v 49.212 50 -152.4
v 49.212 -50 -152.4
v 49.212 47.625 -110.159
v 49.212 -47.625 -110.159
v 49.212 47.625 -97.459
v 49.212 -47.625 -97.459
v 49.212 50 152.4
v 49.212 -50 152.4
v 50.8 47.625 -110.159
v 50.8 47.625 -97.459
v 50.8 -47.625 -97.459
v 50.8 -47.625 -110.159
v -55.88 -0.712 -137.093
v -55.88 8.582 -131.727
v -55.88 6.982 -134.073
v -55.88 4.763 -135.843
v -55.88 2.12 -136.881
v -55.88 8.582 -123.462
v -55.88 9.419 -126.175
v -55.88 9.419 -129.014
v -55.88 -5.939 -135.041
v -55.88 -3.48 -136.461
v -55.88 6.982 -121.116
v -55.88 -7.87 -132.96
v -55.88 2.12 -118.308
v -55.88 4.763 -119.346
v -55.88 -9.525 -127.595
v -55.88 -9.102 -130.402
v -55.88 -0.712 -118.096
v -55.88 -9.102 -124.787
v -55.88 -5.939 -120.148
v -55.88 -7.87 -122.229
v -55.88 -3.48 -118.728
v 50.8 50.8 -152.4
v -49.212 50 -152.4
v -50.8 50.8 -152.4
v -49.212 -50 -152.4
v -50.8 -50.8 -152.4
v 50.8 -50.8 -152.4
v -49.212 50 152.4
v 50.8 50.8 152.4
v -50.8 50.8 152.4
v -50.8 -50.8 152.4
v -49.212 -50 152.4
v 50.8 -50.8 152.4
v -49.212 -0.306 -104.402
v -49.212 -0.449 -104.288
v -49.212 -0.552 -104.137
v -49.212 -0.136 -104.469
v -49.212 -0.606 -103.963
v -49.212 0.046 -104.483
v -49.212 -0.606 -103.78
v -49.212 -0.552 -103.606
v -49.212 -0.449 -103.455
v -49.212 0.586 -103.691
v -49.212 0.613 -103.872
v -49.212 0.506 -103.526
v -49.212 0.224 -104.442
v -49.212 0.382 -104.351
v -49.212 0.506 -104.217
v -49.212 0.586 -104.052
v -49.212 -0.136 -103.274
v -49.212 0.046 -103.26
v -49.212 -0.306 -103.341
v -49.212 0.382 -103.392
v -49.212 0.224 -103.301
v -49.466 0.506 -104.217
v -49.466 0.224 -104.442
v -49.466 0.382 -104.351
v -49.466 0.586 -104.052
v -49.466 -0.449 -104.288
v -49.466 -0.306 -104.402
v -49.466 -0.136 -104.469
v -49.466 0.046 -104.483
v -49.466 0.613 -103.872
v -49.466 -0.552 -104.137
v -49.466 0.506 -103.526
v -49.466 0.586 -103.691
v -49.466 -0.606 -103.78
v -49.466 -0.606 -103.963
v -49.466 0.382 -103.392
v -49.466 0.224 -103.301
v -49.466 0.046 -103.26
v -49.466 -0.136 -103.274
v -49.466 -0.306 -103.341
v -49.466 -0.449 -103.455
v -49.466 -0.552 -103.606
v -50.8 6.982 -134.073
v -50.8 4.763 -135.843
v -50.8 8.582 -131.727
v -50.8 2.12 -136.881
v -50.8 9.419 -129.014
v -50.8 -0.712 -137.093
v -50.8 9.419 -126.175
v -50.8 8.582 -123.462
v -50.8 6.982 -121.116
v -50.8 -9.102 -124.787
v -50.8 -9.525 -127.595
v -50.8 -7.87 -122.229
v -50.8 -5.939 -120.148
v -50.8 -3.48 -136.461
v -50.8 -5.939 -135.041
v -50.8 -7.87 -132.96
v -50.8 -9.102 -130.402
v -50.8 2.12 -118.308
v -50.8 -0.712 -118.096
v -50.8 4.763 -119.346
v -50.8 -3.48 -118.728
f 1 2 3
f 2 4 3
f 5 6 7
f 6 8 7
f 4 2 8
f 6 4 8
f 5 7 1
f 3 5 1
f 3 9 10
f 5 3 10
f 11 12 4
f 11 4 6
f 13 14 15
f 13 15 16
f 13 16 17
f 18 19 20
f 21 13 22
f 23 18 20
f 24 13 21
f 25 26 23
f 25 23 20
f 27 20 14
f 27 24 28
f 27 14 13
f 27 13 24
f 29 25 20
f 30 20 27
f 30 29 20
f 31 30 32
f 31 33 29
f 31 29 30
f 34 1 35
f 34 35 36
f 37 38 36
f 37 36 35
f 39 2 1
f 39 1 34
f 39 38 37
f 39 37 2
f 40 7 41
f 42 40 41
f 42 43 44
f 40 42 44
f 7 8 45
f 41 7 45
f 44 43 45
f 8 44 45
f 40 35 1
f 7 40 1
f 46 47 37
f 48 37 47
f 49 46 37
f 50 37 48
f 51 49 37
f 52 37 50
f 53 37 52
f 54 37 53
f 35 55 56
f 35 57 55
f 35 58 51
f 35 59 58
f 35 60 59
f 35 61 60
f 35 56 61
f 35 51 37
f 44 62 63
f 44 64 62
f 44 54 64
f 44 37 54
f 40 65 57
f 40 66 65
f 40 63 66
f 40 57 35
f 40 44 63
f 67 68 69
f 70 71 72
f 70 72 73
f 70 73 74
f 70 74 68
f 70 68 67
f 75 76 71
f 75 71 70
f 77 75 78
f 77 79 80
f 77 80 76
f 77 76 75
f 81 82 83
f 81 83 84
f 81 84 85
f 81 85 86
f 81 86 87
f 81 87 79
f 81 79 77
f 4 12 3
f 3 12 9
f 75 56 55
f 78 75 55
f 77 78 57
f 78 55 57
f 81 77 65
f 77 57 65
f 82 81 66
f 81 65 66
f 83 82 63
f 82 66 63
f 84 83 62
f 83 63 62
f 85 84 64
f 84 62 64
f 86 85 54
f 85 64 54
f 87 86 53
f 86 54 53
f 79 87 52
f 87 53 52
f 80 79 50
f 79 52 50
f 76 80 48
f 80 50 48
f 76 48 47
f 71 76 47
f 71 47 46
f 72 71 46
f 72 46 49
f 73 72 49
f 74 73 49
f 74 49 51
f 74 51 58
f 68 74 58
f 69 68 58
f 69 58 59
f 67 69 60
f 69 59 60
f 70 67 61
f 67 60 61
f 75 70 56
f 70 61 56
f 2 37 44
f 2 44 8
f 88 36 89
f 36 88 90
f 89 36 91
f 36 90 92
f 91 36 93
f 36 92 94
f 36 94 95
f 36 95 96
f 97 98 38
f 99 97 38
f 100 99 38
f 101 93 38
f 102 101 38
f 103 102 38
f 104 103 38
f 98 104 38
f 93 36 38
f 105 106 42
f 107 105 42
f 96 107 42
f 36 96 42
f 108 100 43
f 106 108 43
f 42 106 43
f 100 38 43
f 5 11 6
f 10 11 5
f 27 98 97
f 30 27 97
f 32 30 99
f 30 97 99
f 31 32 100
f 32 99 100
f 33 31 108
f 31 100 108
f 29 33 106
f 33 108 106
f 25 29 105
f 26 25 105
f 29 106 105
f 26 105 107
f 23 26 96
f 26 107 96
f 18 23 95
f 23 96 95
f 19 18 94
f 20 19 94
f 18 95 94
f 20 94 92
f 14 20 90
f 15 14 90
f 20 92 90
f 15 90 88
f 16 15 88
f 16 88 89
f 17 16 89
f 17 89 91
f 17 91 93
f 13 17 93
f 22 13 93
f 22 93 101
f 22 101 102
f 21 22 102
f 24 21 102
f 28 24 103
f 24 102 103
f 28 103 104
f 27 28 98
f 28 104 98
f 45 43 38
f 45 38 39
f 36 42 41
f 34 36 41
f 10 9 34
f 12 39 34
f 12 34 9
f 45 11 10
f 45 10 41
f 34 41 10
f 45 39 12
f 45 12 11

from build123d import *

# Parameters (mm, degrees)
F0_W     = 101.6
F0_H     = 304.8
F1_DEPTH = 50.8
F2_W     = 98.425
F2_H     = 100.000558
F3_DEPTH = 304.8
F4_W     = 95.25
F4_H     = 12.7
F5_DEPTH = 25.4
F6_R     = 9.525
F7_DEPTH = 5.08
F8_R     = 0.612831
F9_DEPTH = 0.254


with BuildPart() as f1:
    # F0 (on Front) → F1 (new body, symmetric)
    with BuildSketch(Plane.XZ):
        Rectangle(F0_W, F0_H)
    extrude(amount=F1_DEPTH, both=True)

    # F2 (on face) → F3 (cut)
    with BuildSketch(Plane.XY.offset(152.4)):
        Rectangle(F2_W, F2_H)
    extrude(amount=-F3_DEPTH, mode=Mode.SUBTRACT)

    # F4 (on face) → F5 (cut)
    with BuildSketch(Plane.YZ.offset(50.8)):
        with Locations((0, -103.808521)):
            Rectangle(F4_W, F4_H)
    extrude(amount=-F5_DEPTH, mode=Mode.SUBTRACT)

    # F6 (on face) → F7 (join)
    with BuildSketch(Plane(origin=(-50.8, 0, 0), x_dir=(0, -1, 0), z_dir=(-1, 0, 0))):
        with Locations((0, -127.594535)):
            Circle(F6_R)
    extrude(amount=F7_DEPTH)

    # F8 (on face) → F9 (cut)
    with BuildSketch(Plane.YZ.offset(-49.2125)):
        with Locations((0, -103.871576)):
            Circle(F8_R)
    extrude(amount=-F9_DEPTH, mode=Mode.SUBTRACT)


solid = f1.part
